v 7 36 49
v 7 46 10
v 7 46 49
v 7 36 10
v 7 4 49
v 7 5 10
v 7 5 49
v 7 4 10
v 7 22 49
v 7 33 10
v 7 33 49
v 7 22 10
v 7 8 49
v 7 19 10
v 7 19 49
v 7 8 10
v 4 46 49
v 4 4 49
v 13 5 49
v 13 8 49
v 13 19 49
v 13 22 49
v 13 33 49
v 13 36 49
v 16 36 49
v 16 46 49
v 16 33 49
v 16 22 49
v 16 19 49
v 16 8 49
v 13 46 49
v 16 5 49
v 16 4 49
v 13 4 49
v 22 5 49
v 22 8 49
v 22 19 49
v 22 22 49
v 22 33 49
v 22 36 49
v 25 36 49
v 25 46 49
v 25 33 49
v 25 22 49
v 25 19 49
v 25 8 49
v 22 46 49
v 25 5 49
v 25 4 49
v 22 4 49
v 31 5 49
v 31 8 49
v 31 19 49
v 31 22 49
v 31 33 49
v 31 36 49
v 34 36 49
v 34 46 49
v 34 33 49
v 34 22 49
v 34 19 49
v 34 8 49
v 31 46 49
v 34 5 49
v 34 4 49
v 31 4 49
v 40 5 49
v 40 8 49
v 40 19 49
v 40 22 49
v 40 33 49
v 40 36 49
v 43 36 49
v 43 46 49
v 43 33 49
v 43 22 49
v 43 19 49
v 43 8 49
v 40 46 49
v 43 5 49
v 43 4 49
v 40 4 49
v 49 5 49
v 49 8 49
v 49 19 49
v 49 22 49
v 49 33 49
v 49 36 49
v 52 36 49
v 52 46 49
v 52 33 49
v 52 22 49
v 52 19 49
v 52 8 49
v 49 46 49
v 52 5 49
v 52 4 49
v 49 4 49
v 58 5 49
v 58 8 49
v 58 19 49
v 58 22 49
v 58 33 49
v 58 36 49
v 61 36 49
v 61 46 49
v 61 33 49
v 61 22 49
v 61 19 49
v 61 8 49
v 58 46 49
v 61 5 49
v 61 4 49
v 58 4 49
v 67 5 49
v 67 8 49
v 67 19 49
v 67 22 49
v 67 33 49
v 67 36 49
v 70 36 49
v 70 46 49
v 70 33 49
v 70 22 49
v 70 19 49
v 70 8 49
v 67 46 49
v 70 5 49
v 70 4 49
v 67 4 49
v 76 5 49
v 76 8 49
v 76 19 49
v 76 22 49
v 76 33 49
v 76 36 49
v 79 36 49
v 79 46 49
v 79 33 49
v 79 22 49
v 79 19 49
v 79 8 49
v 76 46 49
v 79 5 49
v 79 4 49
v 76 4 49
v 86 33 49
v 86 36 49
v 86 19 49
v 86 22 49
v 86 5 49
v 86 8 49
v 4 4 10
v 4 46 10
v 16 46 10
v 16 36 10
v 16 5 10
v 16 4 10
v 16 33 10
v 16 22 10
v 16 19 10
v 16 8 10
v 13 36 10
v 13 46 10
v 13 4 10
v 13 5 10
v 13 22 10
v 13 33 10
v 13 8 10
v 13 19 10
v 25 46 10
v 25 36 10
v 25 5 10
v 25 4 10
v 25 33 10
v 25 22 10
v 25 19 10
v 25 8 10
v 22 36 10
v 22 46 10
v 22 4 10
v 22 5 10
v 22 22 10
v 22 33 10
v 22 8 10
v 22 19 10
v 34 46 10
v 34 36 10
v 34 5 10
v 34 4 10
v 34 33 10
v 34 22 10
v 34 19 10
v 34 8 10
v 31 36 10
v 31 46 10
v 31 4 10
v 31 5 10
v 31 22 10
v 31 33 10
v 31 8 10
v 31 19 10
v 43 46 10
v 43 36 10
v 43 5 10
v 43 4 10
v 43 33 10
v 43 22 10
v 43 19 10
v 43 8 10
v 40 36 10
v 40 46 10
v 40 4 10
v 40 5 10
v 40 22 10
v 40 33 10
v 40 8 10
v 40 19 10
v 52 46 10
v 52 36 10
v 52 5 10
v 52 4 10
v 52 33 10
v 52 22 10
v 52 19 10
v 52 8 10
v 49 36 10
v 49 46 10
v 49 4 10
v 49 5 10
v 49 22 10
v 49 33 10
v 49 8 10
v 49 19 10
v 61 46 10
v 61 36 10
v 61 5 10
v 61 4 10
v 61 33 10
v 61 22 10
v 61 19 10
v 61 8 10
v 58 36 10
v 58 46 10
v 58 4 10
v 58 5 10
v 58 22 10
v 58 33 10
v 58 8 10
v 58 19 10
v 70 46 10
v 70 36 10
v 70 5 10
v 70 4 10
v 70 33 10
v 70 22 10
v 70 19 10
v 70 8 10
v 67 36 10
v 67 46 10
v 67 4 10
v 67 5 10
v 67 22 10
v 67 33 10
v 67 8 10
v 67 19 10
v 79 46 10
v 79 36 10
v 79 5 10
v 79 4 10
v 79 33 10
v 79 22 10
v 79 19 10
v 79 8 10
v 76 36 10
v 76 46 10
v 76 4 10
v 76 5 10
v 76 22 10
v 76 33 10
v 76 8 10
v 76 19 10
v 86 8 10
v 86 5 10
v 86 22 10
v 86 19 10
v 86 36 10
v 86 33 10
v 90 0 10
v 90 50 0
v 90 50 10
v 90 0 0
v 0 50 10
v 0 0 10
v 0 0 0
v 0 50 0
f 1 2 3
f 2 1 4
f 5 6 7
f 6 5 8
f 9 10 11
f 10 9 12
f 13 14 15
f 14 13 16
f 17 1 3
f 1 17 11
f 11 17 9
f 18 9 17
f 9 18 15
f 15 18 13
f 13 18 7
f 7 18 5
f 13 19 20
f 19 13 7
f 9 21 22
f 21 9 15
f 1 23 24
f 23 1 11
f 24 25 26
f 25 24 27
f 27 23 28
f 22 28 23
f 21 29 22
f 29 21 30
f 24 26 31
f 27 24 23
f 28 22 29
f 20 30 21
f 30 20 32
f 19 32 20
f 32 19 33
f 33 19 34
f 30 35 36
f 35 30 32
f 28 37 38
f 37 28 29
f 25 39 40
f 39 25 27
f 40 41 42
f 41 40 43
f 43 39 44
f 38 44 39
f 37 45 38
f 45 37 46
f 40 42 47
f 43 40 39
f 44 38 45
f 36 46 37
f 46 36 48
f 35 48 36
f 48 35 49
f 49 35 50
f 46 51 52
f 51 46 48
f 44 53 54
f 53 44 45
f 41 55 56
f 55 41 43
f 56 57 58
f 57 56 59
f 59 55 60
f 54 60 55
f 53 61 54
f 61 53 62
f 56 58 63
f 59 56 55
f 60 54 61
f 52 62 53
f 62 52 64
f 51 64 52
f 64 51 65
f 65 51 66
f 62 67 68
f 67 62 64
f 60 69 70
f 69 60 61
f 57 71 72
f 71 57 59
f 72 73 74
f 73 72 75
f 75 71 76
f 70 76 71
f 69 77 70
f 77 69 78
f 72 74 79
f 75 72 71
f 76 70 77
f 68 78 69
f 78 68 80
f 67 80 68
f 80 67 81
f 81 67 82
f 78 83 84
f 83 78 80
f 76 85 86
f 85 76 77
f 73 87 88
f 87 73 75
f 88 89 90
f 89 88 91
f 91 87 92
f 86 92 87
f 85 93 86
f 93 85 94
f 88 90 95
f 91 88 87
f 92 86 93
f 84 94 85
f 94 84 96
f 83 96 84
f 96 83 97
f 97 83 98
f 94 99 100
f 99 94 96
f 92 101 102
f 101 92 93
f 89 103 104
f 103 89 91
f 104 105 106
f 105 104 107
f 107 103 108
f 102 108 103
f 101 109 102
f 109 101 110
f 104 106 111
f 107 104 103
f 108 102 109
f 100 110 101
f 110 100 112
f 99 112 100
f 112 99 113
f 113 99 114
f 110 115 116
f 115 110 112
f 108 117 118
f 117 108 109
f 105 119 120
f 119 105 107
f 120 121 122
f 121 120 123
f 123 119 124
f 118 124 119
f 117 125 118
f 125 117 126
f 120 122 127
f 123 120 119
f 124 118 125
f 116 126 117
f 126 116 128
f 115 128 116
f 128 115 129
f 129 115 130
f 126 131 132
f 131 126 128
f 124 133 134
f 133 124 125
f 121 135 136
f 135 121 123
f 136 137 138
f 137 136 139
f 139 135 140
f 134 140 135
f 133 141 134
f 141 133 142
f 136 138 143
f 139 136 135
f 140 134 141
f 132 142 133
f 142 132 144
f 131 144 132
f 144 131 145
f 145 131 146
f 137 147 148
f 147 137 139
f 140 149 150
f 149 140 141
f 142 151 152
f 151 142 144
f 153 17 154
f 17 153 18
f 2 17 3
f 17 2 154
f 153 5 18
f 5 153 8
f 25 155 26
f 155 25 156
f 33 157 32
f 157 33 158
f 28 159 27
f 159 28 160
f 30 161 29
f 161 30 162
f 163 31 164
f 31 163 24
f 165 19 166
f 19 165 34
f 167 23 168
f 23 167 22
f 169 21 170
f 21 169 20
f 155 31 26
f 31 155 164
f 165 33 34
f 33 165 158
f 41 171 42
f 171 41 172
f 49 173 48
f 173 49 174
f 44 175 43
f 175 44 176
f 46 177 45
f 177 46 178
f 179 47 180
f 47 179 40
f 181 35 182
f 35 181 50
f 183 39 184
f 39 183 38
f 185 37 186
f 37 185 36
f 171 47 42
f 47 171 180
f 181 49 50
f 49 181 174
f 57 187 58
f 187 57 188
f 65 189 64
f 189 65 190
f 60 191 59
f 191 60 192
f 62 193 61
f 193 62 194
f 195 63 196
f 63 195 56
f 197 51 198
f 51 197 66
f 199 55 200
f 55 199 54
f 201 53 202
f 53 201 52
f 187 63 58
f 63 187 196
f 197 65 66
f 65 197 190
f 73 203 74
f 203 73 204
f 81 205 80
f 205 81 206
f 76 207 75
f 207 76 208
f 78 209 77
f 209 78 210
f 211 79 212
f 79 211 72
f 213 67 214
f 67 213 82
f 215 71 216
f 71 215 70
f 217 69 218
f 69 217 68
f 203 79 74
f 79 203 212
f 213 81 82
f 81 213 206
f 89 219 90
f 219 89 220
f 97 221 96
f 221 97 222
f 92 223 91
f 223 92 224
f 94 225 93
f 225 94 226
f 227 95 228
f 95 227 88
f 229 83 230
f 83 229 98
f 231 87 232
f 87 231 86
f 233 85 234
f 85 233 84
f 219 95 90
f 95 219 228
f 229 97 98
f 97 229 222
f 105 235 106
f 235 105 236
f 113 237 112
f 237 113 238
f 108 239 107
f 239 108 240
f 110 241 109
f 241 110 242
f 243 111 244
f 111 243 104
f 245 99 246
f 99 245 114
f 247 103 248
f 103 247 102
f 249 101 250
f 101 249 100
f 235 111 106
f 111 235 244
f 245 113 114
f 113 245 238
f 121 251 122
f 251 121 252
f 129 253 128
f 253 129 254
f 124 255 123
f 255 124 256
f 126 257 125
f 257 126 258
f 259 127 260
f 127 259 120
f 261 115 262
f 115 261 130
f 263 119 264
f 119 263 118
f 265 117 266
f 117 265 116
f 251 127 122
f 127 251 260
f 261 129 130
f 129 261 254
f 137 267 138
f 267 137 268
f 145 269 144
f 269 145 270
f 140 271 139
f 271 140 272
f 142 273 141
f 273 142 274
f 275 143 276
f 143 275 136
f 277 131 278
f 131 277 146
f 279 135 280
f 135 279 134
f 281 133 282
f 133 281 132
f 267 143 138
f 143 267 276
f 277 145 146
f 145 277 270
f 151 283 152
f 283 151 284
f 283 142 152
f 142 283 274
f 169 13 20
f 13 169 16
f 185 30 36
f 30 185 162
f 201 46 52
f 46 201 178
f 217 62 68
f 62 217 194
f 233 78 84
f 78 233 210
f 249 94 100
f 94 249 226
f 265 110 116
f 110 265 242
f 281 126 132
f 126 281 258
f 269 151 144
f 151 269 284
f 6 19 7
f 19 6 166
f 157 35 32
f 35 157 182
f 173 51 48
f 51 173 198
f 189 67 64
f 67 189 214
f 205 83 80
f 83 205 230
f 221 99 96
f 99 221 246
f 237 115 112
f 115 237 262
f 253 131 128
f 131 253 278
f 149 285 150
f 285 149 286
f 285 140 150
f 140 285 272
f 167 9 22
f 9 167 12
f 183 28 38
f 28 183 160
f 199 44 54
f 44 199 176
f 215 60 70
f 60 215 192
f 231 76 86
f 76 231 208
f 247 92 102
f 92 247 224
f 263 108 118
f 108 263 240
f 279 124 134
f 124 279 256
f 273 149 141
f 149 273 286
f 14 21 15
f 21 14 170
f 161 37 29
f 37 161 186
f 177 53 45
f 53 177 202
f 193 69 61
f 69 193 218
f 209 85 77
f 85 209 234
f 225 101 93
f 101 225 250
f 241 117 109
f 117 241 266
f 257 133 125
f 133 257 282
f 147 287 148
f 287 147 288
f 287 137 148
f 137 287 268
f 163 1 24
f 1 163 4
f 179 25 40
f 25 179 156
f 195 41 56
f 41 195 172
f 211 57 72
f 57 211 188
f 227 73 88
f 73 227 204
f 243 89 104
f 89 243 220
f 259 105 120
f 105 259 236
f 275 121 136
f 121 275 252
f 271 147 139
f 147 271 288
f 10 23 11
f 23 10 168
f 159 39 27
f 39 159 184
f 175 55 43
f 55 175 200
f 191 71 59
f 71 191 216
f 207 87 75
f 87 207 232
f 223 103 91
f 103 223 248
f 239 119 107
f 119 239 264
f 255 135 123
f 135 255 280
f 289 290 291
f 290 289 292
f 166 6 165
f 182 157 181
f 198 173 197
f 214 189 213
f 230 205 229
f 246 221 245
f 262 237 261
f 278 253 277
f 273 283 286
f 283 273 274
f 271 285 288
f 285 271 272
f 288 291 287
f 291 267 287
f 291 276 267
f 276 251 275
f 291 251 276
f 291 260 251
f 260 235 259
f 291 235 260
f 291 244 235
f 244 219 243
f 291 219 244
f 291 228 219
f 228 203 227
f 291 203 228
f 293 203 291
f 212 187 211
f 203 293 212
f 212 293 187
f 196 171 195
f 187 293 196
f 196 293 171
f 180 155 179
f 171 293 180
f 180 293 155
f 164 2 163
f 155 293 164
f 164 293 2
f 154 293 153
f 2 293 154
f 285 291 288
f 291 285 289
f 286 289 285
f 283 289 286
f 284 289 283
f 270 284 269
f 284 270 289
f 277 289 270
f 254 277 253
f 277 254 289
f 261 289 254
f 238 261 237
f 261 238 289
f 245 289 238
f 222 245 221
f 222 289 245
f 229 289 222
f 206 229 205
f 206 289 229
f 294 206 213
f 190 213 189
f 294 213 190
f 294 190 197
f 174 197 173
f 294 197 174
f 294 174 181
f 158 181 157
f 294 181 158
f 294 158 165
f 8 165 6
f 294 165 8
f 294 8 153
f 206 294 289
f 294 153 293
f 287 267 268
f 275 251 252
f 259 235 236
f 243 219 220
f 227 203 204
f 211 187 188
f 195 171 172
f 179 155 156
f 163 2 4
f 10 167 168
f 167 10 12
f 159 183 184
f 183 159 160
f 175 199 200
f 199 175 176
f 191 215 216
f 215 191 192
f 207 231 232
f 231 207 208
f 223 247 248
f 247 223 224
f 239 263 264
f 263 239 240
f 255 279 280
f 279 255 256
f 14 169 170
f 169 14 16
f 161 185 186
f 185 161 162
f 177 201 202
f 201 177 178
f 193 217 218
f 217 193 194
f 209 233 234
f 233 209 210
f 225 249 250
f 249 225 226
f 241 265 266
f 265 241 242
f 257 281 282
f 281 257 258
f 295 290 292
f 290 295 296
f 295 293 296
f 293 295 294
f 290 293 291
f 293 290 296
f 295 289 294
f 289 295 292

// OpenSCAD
$fn = 32;

// ----------------------------------------------------------------------
// Heatsink: cross fin block
// ----------------------------------------------------------------------

// --- parameters (mm) ---
base_l = 90;              // base length, X
base_w = 50;              // base width, Y
base_t = 10;              // base plate thickness
fin_h = 40;               // fin height above the base
fin_t = 3;                // fin thickness
edge = 4;                 // margin from the base ends
pitch = 9;                // fin pitch
rib_pitch = 14;           // cross rib pitch

n_fins = floor((base_l - 2 * edge - fin_t) / pitch) + 1;  // fin count
total_h = base_t + fin_h - 1;  // overall height
n_ribs = floor((base_w - 2 * edge) / rib_pitch);  // rib count

union() {
  cube([base_l, base_w, base_t]);
  for (i = [0 : n_fins - 1])
    translate([edge + i * pitch, edge, base_t - 1])
      cube([fin_t, base_w - 2 * edge, fin_h]);
  for (i = [0 : n_ribs - 1])
    translate([edge, edge + 1 + i * rib_pitch, base_t - 1])
      cube([base_l - 2 * edge, fin_t, fin_h]);
}
